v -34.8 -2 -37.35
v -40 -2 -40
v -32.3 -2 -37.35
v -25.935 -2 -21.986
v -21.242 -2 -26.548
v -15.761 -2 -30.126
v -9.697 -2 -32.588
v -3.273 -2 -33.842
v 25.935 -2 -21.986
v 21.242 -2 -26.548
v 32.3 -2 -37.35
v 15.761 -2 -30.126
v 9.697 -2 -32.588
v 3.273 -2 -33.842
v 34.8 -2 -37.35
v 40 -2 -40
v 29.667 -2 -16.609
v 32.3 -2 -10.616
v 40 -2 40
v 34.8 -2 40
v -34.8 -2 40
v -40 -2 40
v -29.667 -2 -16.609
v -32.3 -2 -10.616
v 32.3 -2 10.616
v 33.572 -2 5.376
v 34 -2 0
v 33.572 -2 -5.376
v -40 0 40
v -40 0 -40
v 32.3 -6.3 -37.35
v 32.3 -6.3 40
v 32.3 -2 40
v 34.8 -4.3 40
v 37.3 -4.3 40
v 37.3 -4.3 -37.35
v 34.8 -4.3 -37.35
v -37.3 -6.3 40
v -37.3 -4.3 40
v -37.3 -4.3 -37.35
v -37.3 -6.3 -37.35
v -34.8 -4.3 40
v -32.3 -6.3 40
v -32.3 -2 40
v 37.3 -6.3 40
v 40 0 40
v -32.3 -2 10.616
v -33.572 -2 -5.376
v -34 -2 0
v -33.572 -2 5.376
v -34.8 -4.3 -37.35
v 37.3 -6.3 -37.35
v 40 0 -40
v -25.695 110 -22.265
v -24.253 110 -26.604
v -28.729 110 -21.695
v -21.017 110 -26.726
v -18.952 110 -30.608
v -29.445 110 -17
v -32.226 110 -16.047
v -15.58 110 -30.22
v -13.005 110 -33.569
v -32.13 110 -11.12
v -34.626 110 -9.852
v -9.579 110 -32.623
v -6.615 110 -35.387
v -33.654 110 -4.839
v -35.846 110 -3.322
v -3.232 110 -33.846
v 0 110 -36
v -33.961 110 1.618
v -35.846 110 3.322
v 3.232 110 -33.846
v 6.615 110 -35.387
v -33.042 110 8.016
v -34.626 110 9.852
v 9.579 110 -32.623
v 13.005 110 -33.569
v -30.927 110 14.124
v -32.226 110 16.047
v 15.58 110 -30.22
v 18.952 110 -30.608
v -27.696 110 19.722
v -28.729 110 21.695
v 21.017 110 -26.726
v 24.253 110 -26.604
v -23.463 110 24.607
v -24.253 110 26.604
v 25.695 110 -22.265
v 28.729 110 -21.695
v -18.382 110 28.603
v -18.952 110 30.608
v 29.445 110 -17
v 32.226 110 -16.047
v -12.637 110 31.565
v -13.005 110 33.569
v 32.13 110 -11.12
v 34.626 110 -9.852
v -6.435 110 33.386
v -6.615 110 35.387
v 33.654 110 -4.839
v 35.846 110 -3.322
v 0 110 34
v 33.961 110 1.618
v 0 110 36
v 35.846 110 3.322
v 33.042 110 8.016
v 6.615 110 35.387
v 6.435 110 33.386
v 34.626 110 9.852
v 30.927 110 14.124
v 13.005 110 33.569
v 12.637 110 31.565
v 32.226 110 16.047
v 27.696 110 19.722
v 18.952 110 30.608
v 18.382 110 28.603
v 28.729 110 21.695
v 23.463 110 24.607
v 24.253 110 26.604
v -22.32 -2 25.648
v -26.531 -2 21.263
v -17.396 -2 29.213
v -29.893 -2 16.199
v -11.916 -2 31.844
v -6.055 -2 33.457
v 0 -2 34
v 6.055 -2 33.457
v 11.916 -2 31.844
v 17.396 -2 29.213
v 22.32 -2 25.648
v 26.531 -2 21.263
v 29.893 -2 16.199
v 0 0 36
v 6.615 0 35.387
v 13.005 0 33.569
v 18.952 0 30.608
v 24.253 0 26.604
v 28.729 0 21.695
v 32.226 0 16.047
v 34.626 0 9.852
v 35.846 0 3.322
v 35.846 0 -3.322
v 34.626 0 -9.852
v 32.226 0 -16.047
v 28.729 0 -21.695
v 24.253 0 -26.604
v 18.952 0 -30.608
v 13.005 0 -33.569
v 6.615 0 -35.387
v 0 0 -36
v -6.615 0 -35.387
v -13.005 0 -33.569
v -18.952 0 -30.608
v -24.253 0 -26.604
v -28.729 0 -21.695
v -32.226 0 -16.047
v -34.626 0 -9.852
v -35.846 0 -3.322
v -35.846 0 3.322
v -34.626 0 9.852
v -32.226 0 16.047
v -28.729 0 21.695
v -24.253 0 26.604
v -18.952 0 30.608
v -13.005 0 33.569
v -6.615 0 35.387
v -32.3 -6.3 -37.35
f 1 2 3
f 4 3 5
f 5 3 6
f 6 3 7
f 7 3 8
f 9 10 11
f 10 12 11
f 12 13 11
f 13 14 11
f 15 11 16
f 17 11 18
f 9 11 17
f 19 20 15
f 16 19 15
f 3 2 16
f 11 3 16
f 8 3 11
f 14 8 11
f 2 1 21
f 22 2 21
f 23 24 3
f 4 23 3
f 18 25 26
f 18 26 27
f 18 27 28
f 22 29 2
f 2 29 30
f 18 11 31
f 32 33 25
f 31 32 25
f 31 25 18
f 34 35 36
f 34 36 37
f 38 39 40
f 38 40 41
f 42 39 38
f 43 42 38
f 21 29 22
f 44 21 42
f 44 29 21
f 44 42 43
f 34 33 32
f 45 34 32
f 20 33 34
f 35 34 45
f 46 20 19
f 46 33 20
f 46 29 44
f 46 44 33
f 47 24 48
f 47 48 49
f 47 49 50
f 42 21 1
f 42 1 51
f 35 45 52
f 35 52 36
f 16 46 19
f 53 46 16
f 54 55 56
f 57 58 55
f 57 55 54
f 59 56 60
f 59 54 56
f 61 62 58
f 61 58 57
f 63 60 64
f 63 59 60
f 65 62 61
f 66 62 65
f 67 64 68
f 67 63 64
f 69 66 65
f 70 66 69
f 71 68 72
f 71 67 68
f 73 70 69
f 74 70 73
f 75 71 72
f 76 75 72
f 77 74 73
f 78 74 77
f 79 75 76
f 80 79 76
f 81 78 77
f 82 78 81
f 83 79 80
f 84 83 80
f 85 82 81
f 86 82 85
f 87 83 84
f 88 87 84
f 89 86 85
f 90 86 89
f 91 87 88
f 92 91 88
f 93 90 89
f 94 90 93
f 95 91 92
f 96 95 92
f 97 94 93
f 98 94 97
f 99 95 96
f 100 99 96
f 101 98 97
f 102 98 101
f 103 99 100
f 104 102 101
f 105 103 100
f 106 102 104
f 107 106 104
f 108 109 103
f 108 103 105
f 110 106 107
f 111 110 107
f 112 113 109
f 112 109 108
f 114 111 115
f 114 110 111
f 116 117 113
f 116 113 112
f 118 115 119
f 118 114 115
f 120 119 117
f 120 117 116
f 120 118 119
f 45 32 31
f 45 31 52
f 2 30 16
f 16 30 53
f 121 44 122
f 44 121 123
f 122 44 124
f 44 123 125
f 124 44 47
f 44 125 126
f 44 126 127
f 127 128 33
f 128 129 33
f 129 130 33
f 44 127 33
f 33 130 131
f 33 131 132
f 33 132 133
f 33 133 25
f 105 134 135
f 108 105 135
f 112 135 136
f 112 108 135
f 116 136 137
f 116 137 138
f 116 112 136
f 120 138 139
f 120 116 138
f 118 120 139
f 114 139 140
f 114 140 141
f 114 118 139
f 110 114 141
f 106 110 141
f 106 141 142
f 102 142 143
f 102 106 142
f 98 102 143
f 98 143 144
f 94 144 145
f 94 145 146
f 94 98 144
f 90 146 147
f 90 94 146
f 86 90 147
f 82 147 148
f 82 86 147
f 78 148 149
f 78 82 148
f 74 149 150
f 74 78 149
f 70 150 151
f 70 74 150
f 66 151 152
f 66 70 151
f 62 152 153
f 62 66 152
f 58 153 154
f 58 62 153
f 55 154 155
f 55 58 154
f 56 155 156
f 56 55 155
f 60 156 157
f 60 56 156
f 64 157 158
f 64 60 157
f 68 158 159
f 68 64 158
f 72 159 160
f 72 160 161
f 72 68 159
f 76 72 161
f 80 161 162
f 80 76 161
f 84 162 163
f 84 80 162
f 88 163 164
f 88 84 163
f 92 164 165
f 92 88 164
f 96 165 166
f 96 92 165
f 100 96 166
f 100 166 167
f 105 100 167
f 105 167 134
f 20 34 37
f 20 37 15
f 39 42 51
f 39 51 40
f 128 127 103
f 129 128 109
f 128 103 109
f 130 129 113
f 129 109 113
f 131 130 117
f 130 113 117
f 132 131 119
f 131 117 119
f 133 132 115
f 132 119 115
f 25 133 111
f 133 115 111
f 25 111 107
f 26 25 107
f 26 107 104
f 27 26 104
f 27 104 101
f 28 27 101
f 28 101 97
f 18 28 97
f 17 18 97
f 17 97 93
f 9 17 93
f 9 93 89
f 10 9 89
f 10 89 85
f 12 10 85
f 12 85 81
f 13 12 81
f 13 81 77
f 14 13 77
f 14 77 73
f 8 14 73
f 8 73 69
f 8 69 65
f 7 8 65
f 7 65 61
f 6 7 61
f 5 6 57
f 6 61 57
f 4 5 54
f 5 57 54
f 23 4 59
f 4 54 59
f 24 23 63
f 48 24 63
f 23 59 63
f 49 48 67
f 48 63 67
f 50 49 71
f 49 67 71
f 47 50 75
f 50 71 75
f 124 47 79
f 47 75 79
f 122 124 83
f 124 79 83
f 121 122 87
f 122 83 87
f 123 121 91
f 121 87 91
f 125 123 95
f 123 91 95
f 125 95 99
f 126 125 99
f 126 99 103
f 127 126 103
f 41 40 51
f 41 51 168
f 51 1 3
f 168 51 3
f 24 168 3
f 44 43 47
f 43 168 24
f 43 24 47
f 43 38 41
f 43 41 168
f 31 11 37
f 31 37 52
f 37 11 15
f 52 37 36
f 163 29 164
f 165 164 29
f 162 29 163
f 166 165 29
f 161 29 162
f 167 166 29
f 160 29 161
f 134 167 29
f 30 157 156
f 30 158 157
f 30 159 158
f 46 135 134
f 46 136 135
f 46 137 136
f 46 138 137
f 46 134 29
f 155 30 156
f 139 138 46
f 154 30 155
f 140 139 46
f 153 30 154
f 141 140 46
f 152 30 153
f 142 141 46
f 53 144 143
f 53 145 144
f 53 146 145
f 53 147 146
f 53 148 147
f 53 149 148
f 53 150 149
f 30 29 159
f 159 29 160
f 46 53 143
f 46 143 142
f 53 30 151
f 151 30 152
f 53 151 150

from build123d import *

# Parameters (mm, degrees)
SKETCH1_W           = 80
SKETCH1_H           = 80
SKETCH1_R           = 36
SKETCH1_R_2         = 34
BOSS_EXTRUDE3_DEPTH = 2
BOSS_EXTRUDE4_START = 110
SKETCH1_7_R         = 36
SKETCH1_7_R_2       = 34
BOSS_EXTRUDE4_DEPTH = 110
BOSS_EXTRUDE5_DEPTH = 77.35


with BuildPart() as part:
    # Sketch1 → Boss-Extrude3 (new body)
    # profile 1 of 2: a face of its own
    with BuildSketch(Plane(origin=(0, 0, 0), x_dir=(1, 0, 0), z_dir=(0, 1, 0))):
        Rectangle(SKETCH1_W, SKETCH1_H)
        Circle(SKETCH1_R, mode=Mode.SUBTRACT)
    # profile 2 of 2: a face of its own
    with BuildSketch(Plane(origin=(0, 0, 0), x_dir=(1, 0, 0), z_dir=(0, 1, 0))):
        Circle(SKETCH1_R)
        with Locations(Location((0, 0, 0), (0, 0, 270))):
            Circle(SKETCH1_R_2, mode=Mode.SUBTRACT)
    extrude(amount=-BOSS_EXTRUDE3_DEPTH)

    # Sketch1<7> → Boss-Extrude4 (add)
    with BuildSketch(Plane(origin=(0, 0, 0), x_dir=(1, 0, 0), z_dir=(0, 1, 0)).offset(BOSS_EXTRUDE4_START)):
        with Locations(Location((0, 0, 0), (0, 0, 270))):
            Circle(SKETCH1_7_R)
        with Locations(Location((0, 0, 0), (0, 0, 270))):
            Circle(SKETCH1_7_R_2, mode=Mode.SUBTRACT)
    extrude(amount=-BOSS_EXTRUDE4_DEPTH)

    # Sketch3 → Boss-Extrude5 (add)
    with BuildSketch(Plane.XY.offset(40)):
        Polygon((-32.3, -2), (-34.8, -2), (-34.8, -4.3), (-37.3, -4.3), (-37.3, -6.3), (-32.3, -6.3), align=None)
        Polygon((32.3, -6.3), (37.3, -6.3), (37.3, -4.3), (34.8, -4.3), (34.8, -2), (32.3, -2), align=None)
    extrude(amount=-BOSS_EXTRUDE5_DEPTH)


solid = part.part
